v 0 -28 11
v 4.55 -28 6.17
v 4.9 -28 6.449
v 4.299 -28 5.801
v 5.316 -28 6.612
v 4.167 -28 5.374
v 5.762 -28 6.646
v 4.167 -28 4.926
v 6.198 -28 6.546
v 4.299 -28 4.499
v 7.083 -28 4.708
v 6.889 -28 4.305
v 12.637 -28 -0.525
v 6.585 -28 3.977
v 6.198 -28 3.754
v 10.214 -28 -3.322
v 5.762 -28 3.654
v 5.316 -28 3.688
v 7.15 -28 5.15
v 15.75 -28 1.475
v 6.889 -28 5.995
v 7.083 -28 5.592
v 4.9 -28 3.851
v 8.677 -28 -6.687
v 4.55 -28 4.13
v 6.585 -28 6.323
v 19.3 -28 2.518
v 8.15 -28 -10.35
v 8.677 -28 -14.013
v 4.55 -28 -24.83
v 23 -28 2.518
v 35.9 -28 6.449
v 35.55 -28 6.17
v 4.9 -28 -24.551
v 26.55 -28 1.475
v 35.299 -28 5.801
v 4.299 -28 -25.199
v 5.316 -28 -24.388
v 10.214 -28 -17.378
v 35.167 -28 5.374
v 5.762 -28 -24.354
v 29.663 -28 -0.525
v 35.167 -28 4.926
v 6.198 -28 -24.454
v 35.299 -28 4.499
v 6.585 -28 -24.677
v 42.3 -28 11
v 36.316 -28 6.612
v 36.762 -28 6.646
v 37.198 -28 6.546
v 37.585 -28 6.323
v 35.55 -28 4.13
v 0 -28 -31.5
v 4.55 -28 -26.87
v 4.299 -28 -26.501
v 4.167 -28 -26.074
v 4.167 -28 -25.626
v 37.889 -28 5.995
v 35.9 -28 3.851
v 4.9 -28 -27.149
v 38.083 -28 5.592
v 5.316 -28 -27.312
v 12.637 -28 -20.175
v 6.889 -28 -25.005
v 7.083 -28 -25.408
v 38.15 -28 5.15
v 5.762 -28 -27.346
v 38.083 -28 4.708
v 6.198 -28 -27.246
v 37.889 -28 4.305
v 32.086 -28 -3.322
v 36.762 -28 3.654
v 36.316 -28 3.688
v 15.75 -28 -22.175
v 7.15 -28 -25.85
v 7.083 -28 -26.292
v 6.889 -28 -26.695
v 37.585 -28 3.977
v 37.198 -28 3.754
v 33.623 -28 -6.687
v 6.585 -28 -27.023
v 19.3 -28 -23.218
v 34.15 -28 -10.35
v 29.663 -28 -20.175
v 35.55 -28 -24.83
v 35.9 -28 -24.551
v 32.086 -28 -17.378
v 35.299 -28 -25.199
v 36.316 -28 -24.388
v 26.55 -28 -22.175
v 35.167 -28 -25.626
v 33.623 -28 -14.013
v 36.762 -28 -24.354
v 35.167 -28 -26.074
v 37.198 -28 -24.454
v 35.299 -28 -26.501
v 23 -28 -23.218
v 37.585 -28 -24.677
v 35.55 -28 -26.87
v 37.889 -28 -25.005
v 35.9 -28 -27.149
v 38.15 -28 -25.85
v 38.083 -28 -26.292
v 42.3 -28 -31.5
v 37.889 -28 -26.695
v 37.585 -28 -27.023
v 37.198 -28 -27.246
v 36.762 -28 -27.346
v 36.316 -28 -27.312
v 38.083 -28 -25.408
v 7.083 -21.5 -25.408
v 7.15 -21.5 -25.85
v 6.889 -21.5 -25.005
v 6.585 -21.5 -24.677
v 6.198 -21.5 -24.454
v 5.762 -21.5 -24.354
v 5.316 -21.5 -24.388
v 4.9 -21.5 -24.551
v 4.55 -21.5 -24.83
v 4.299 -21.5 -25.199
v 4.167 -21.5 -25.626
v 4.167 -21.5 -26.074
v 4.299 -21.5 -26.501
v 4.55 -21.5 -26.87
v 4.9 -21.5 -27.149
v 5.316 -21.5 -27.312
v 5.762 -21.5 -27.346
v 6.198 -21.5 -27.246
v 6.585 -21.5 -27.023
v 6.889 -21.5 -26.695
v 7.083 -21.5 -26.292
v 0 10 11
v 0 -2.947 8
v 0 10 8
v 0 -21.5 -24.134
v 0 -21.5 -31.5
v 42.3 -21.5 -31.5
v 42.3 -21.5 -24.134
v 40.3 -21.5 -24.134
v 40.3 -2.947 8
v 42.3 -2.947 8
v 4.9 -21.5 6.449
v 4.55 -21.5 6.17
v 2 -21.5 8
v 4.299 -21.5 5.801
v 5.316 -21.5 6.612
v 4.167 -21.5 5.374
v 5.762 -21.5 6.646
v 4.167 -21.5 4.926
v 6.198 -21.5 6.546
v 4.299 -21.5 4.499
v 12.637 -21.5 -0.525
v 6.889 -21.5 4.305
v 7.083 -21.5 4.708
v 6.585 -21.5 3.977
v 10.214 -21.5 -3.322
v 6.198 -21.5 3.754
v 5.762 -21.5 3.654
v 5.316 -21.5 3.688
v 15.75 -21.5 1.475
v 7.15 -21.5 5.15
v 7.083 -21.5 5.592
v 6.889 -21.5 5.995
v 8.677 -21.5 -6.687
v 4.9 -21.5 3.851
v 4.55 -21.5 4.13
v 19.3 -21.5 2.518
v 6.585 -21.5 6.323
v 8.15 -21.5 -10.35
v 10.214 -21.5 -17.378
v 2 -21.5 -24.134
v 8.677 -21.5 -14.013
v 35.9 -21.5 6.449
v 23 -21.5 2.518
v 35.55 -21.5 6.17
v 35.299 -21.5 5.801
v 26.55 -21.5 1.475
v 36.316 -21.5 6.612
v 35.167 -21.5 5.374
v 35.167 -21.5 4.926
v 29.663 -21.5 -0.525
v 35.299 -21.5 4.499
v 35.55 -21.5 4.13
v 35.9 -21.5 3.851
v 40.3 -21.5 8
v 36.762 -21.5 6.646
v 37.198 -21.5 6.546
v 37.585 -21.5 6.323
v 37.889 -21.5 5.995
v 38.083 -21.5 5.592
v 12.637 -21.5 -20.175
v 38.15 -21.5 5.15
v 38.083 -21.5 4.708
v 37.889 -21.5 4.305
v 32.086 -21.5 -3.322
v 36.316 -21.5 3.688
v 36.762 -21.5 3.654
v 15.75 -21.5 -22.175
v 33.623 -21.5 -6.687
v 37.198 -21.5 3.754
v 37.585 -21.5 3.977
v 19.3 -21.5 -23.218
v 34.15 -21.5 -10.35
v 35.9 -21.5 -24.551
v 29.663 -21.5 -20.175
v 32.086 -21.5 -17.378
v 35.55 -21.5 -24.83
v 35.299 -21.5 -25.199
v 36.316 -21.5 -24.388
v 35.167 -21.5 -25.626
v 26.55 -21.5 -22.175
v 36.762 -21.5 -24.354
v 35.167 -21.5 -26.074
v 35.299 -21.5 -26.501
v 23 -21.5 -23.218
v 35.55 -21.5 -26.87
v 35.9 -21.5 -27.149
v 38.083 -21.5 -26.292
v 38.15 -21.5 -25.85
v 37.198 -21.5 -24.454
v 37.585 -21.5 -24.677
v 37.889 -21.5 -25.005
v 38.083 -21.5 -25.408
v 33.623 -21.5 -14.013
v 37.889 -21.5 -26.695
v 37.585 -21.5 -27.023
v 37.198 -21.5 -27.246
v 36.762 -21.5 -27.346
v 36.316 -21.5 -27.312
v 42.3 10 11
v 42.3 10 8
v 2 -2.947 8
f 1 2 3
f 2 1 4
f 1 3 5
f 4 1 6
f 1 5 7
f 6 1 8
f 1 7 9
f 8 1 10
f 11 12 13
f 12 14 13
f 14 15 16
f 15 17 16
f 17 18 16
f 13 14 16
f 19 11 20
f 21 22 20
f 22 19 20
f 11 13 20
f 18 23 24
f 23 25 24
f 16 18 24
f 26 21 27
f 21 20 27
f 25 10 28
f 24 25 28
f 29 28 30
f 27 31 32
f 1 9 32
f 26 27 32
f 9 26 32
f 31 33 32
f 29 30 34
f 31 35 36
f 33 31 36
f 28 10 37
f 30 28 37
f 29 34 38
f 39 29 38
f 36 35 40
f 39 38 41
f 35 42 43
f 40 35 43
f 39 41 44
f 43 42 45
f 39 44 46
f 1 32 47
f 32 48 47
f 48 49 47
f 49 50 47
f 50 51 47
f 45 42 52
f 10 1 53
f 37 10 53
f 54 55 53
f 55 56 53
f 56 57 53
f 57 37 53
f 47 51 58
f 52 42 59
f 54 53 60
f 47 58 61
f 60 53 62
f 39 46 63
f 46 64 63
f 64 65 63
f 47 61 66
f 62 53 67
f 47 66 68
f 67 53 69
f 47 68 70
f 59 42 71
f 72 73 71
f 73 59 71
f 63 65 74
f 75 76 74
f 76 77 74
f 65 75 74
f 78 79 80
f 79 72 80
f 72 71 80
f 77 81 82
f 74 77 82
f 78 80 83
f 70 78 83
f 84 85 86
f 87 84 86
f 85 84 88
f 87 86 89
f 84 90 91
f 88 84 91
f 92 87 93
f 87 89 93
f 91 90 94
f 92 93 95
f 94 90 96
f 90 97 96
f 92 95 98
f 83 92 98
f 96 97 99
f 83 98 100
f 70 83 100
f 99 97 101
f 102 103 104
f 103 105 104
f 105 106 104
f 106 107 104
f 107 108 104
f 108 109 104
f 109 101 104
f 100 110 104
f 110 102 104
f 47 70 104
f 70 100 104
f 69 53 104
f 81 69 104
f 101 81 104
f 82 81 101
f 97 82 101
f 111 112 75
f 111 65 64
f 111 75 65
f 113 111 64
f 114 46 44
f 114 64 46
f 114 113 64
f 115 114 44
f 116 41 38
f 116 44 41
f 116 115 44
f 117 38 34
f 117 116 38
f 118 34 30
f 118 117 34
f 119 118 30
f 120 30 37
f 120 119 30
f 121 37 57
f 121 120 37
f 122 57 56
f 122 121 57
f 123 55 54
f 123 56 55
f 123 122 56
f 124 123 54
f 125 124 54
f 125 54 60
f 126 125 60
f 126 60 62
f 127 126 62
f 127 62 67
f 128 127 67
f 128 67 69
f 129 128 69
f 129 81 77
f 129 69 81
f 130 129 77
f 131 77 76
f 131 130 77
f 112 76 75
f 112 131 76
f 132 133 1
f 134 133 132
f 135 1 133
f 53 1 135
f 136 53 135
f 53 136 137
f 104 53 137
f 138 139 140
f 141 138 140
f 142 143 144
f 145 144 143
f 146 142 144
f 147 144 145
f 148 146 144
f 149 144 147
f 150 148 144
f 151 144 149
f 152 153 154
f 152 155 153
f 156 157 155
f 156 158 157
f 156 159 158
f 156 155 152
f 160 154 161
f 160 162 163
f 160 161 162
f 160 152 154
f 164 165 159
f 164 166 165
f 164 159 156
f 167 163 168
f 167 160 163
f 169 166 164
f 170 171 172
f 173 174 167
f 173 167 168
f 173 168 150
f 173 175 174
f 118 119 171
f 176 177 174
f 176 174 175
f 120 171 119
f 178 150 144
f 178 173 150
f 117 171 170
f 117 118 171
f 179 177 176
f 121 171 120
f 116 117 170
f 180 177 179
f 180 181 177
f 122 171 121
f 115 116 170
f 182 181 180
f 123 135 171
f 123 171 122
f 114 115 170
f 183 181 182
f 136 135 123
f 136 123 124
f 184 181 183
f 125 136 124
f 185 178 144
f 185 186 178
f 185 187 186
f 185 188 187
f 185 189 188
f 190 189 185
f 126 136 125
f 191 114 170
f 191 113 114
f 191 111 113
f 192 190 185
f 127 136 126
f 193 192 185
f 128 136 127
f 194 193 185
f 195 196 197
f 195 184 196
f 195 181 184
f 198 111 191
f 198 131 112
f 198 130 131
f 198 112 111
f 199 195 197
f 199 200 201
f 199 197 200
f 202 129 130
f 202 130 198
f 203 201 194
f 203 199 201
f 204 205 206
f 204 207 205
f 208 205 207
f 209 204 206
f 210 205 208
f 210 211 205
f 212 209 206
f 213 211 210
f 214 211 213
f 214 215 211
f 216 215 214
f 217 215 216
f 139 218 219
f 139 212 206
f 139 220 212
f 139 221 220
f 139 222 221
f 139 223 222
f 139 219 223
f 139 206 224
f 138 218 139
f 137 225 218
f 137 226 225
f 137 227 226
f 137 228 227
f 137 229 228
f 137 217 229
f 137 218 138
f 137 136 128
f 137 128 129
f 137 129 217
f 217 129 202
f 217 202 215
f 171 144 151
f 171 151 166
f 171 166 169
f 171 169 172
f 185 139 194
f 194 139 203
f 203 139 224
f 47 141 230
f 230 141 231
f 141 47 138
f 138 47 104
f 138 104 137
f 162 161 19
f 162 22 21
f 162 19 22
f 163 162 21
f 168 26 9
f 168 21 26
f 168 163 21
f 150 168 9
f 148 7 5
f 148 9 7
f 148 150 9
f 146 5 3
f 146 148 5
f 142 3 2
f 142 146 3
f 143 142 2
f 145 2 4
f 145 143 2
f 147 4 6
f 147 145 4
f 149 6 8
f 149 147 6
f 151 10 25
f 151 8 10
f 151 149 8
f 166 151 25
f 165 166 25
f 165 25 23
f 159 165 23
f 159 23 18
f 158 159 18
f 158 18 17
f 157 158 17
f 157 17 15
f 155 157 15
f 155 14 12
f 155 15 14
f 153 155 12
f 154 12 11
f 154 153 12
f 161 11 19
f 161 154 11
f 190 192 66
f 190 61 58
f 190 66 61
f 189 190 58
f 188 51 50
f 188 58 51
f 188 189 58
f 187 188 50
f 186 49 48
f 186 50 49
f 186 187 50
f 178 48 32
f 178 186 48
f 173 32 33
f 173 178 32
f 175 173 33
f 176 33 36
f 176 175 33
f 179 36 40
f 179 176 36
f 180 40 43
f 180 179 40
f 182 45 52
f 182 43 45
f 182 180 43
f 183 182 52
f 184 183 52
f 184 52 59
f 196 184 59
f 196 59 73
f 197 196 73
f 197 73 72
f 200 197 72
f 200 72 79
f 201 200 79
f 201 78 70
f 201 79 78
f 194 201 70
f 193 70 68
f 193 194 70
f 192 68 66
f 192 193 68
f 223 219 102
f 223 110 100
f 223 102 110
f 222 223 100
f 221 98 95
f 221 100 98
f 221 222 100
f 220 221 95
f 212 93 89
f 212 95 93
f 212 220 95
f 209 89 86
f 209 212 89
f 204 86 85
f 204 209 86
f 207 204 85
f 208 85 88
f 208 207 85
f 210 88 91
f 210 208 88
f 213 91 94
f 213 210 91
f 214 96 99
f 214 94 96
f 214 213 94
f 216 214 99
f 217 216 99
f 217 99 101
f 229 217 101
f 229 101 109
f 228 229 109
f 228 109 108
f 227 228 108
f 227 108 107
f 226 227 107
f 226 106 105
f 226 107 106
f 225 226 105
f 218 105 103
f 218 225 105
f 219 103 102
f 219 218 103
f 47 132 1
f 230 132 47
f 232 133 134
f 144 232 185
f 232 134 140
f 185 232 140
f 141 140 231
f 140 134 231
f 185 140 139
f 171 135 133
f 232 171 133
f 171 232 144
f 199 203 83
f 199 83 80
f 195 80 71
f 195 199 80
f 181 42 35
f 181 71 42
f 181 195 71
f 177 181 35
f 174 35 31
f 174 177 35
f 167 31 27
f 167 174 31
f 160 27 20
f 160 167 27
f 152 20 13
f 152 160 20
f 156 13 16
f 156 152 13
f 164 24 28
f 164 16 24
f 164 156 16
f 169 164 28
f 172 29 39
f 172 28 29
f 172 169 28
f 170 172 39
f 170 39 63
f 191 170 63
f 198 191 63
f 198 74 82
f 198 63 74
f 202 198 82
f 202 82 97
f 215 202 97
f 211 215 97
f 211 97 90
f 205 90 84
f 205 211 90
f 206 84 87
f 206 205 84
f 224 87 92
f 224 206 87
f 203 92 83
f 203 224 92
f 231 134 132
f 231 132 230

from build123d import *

# Parameters (mm, degrees)
BOX009_W          = 44
BOX009_H          = 24
BOX009_DEPTH      = 70
PRISM001_DEPTH    = 2
BOX008_W          = 42.3
BOX008_H          = 38
BOX008_DEPTH      = 3
CYLINDER005_R     = 13
CYLINDER005_DEPTH = 10
CYLINDER002_R     = 1.5
CYLINDER002_DEPTH = 10
CYLINDER003_R     = 1.5
CYLINDER003_DEPTH = 10
CYLINDER004_R     = 1.5
CYLINDER004_DEPTH = 10
CYLINDER001_R     = 1.5
CYLINDER001_DEPTH = 10
BOX007_W          = 42.3
BOX007_H          = 6.5
BOX007_DEPTH      = 42.3
BOX010_W          = 44
BOX010_H          = 24
BOX010_DEPTH      = 70
PRISM002_DEPTH    = 2


with BuildPart() as cube009:
    # Box009 → Box009 (new body)
    with BuildSketch(Plane(origin=(0, -43, -25.5), x_dir=(1, 0, 0), z_dir=(0, 0, 1))):
        with Locations((22, 12)):
            Rectangle(BOX009_W, BOX009_H)
    extrude(amount=BOX009_DEPTH)


with BuildPart() as cut012:
    # Prism001 → Prism001 (new body)
    with BuildSketch(Plane(origin=(0, -19, 2), x_dir=(0, 0, -1), z_dir=(1, 0, 0))):
        Polygon((23, 0), (-11.5, 19.918584), (-11.5, -19.918584), align=None)
    extrude(amount=PRISM001_DEPTH)

    # Cut012: cut Cube009
    add(cube009.part, mode=Mode.SUBTRACT)


with BuildPart() as cut012_1:
    # Cut012 placement: moved
    add(cut012.part.moved(Location((0, -3, -4))))


with BuildPart() as cube008:
    # Box008 → Box008 (new body)
    with BuildSketch(Plane(origin=(0, -28, 8), x_dir=(1, 0, 0), z_dir=(0, 0, 1))):
        with Locations((21.15, 19)):
            Rectangle(BOX008_W, BOX008_H)
    extrude(amount=BOX008_DEPTH)


with BuildPart() as cylinder005:
    # Cylinder005 → Cylinder005 (new body)
    with BuildSketch(Plane(origin=(21.15, -14, 21.15), x_dir=(1, 0, 0), z_dir=(0, -1, 0))):
        Circle(CYLINDER005_R)
    extrude(amount=CYLINDER005_DEPTH)


with BuildPart() as cylinder002:
    # Cylinder002 → Cylinder002 (new body)
    with BuildSketch(Plane(origin=(5.65, -14, 36.65), x_dir=(1, 0, 0), z_dir=(0, -1, 0))):
        Circle(CYLINDER002_R)
    extrude(amount=CYLINDER002_DEPTH)


with BuildPart() as cylinder003:
    # Cylinder003 → Cylinder003 (new body)
    with BuildSketch(Plane(origin=(36.65, -14, 5.65), x_dir=(1, 0, 0), z_dir=(0, -1, 0))):
        Circle(CYLINDER003_R)
    extrude(amount=CYLINDER003_DEPTH)


with BuildPart() as cylinder004:
    # Cylinder004 → Cylinder004 (new body)
    with BuildSketch(Plane(origin=(36.65, -14, 36.65), x_dir=(1, 0, 0), z_dir=(0, -1, 0))):
        Circle(CYLINDER004_R)
    extrude(amount=CYLINDER004_DEPTH)


with BuildPart() as cylinder001:
    # Cylinder001 → Cylinder001 (new body)
    with BuildSketch(Plane(origin=(5.65, -14, 5.65), x_dir=(1, 0, 0), z_dir=(0, -1, 0))):
        Circle(CYLINDER001_R)
    extrude(amount=CYLINDER001_DEPTH)


with BuildPart() as fusion002:
    # Box007 → Box007 (new body)
    with BuildSketch(Plane(origin=(0, -21, 0), x_dir=(1, 0, 0), z_dir=(0, 0, 1))):
        with Locations((21.15, 3.25)):
            Rectangle(BOX007_W, BOX007_H)
    extrude(amount=BOX007_DEPTH)

    # Cut007: cut Cylinder001
    add(cylinder001.part, mode=Mode.SUBTRACT)

    # Cut008: cut Cylinder004
    add(cylinder004.part, mode=Mode.SUBTRACT)

    # Cut009: cut Cylinder003
    add(cylinder003.part, mode=Mode.SUBTRACT)

    # Cut010: cut Cylinder002
    add(cylinder002.part, mode=Mode.SUBTRACT)

    # Cut011: cut Cylinder005
    add(cylinder005.part, mode=Mode.SUBTRACT)


with BuildPart() as fusion002_1:
    # Cut011 placement: moved
    add(fusion002.part.moved(Location((0, -7, -31.5))))

    # Fusion001: union Cube008
    add(cube008.part)

    # Fusion002: union Cut012
    add(cut012_1.part)


with BuildPart() as cube010:
    # Box010 → Box010 (new body)
    with BuildSketch(Plane(origin=(0, -43, -25.5), x_dir=(1, 0, 0), z_dir=(0, 0, 1))):
        with Locations((22, 12)):
            Rectangle(BOX010_W, BOX010_H)
    extrude(amount=BOX010_DEPTH)


with BuildPart() as motormountv1:
    # Prism002 → Prism002 (new body)
    with BuildSketch(Plane(origin=(0, -19, 2), x_dir=(0, 0, -1), z_dir=(1, 0, 0))):
        Polygon((23, 0), (-11.5, 19.918584), (-11.5, -19.918584), align=None)
    extrude(amount=PRISM002_DEPTH)

    # Cut013: cut Cube010
    add(cube010.part, mode=Mode.SUBTRACT)


with BuildPart() as motormountv1_1:
    # Cut013 placement: moved
    add(motormountv1.part.moved(Location((40.3, -3, -4))))

    # Fusion003: union Fusion002
    add(fusion002_1.part)


solid = motormountv1_1.part
